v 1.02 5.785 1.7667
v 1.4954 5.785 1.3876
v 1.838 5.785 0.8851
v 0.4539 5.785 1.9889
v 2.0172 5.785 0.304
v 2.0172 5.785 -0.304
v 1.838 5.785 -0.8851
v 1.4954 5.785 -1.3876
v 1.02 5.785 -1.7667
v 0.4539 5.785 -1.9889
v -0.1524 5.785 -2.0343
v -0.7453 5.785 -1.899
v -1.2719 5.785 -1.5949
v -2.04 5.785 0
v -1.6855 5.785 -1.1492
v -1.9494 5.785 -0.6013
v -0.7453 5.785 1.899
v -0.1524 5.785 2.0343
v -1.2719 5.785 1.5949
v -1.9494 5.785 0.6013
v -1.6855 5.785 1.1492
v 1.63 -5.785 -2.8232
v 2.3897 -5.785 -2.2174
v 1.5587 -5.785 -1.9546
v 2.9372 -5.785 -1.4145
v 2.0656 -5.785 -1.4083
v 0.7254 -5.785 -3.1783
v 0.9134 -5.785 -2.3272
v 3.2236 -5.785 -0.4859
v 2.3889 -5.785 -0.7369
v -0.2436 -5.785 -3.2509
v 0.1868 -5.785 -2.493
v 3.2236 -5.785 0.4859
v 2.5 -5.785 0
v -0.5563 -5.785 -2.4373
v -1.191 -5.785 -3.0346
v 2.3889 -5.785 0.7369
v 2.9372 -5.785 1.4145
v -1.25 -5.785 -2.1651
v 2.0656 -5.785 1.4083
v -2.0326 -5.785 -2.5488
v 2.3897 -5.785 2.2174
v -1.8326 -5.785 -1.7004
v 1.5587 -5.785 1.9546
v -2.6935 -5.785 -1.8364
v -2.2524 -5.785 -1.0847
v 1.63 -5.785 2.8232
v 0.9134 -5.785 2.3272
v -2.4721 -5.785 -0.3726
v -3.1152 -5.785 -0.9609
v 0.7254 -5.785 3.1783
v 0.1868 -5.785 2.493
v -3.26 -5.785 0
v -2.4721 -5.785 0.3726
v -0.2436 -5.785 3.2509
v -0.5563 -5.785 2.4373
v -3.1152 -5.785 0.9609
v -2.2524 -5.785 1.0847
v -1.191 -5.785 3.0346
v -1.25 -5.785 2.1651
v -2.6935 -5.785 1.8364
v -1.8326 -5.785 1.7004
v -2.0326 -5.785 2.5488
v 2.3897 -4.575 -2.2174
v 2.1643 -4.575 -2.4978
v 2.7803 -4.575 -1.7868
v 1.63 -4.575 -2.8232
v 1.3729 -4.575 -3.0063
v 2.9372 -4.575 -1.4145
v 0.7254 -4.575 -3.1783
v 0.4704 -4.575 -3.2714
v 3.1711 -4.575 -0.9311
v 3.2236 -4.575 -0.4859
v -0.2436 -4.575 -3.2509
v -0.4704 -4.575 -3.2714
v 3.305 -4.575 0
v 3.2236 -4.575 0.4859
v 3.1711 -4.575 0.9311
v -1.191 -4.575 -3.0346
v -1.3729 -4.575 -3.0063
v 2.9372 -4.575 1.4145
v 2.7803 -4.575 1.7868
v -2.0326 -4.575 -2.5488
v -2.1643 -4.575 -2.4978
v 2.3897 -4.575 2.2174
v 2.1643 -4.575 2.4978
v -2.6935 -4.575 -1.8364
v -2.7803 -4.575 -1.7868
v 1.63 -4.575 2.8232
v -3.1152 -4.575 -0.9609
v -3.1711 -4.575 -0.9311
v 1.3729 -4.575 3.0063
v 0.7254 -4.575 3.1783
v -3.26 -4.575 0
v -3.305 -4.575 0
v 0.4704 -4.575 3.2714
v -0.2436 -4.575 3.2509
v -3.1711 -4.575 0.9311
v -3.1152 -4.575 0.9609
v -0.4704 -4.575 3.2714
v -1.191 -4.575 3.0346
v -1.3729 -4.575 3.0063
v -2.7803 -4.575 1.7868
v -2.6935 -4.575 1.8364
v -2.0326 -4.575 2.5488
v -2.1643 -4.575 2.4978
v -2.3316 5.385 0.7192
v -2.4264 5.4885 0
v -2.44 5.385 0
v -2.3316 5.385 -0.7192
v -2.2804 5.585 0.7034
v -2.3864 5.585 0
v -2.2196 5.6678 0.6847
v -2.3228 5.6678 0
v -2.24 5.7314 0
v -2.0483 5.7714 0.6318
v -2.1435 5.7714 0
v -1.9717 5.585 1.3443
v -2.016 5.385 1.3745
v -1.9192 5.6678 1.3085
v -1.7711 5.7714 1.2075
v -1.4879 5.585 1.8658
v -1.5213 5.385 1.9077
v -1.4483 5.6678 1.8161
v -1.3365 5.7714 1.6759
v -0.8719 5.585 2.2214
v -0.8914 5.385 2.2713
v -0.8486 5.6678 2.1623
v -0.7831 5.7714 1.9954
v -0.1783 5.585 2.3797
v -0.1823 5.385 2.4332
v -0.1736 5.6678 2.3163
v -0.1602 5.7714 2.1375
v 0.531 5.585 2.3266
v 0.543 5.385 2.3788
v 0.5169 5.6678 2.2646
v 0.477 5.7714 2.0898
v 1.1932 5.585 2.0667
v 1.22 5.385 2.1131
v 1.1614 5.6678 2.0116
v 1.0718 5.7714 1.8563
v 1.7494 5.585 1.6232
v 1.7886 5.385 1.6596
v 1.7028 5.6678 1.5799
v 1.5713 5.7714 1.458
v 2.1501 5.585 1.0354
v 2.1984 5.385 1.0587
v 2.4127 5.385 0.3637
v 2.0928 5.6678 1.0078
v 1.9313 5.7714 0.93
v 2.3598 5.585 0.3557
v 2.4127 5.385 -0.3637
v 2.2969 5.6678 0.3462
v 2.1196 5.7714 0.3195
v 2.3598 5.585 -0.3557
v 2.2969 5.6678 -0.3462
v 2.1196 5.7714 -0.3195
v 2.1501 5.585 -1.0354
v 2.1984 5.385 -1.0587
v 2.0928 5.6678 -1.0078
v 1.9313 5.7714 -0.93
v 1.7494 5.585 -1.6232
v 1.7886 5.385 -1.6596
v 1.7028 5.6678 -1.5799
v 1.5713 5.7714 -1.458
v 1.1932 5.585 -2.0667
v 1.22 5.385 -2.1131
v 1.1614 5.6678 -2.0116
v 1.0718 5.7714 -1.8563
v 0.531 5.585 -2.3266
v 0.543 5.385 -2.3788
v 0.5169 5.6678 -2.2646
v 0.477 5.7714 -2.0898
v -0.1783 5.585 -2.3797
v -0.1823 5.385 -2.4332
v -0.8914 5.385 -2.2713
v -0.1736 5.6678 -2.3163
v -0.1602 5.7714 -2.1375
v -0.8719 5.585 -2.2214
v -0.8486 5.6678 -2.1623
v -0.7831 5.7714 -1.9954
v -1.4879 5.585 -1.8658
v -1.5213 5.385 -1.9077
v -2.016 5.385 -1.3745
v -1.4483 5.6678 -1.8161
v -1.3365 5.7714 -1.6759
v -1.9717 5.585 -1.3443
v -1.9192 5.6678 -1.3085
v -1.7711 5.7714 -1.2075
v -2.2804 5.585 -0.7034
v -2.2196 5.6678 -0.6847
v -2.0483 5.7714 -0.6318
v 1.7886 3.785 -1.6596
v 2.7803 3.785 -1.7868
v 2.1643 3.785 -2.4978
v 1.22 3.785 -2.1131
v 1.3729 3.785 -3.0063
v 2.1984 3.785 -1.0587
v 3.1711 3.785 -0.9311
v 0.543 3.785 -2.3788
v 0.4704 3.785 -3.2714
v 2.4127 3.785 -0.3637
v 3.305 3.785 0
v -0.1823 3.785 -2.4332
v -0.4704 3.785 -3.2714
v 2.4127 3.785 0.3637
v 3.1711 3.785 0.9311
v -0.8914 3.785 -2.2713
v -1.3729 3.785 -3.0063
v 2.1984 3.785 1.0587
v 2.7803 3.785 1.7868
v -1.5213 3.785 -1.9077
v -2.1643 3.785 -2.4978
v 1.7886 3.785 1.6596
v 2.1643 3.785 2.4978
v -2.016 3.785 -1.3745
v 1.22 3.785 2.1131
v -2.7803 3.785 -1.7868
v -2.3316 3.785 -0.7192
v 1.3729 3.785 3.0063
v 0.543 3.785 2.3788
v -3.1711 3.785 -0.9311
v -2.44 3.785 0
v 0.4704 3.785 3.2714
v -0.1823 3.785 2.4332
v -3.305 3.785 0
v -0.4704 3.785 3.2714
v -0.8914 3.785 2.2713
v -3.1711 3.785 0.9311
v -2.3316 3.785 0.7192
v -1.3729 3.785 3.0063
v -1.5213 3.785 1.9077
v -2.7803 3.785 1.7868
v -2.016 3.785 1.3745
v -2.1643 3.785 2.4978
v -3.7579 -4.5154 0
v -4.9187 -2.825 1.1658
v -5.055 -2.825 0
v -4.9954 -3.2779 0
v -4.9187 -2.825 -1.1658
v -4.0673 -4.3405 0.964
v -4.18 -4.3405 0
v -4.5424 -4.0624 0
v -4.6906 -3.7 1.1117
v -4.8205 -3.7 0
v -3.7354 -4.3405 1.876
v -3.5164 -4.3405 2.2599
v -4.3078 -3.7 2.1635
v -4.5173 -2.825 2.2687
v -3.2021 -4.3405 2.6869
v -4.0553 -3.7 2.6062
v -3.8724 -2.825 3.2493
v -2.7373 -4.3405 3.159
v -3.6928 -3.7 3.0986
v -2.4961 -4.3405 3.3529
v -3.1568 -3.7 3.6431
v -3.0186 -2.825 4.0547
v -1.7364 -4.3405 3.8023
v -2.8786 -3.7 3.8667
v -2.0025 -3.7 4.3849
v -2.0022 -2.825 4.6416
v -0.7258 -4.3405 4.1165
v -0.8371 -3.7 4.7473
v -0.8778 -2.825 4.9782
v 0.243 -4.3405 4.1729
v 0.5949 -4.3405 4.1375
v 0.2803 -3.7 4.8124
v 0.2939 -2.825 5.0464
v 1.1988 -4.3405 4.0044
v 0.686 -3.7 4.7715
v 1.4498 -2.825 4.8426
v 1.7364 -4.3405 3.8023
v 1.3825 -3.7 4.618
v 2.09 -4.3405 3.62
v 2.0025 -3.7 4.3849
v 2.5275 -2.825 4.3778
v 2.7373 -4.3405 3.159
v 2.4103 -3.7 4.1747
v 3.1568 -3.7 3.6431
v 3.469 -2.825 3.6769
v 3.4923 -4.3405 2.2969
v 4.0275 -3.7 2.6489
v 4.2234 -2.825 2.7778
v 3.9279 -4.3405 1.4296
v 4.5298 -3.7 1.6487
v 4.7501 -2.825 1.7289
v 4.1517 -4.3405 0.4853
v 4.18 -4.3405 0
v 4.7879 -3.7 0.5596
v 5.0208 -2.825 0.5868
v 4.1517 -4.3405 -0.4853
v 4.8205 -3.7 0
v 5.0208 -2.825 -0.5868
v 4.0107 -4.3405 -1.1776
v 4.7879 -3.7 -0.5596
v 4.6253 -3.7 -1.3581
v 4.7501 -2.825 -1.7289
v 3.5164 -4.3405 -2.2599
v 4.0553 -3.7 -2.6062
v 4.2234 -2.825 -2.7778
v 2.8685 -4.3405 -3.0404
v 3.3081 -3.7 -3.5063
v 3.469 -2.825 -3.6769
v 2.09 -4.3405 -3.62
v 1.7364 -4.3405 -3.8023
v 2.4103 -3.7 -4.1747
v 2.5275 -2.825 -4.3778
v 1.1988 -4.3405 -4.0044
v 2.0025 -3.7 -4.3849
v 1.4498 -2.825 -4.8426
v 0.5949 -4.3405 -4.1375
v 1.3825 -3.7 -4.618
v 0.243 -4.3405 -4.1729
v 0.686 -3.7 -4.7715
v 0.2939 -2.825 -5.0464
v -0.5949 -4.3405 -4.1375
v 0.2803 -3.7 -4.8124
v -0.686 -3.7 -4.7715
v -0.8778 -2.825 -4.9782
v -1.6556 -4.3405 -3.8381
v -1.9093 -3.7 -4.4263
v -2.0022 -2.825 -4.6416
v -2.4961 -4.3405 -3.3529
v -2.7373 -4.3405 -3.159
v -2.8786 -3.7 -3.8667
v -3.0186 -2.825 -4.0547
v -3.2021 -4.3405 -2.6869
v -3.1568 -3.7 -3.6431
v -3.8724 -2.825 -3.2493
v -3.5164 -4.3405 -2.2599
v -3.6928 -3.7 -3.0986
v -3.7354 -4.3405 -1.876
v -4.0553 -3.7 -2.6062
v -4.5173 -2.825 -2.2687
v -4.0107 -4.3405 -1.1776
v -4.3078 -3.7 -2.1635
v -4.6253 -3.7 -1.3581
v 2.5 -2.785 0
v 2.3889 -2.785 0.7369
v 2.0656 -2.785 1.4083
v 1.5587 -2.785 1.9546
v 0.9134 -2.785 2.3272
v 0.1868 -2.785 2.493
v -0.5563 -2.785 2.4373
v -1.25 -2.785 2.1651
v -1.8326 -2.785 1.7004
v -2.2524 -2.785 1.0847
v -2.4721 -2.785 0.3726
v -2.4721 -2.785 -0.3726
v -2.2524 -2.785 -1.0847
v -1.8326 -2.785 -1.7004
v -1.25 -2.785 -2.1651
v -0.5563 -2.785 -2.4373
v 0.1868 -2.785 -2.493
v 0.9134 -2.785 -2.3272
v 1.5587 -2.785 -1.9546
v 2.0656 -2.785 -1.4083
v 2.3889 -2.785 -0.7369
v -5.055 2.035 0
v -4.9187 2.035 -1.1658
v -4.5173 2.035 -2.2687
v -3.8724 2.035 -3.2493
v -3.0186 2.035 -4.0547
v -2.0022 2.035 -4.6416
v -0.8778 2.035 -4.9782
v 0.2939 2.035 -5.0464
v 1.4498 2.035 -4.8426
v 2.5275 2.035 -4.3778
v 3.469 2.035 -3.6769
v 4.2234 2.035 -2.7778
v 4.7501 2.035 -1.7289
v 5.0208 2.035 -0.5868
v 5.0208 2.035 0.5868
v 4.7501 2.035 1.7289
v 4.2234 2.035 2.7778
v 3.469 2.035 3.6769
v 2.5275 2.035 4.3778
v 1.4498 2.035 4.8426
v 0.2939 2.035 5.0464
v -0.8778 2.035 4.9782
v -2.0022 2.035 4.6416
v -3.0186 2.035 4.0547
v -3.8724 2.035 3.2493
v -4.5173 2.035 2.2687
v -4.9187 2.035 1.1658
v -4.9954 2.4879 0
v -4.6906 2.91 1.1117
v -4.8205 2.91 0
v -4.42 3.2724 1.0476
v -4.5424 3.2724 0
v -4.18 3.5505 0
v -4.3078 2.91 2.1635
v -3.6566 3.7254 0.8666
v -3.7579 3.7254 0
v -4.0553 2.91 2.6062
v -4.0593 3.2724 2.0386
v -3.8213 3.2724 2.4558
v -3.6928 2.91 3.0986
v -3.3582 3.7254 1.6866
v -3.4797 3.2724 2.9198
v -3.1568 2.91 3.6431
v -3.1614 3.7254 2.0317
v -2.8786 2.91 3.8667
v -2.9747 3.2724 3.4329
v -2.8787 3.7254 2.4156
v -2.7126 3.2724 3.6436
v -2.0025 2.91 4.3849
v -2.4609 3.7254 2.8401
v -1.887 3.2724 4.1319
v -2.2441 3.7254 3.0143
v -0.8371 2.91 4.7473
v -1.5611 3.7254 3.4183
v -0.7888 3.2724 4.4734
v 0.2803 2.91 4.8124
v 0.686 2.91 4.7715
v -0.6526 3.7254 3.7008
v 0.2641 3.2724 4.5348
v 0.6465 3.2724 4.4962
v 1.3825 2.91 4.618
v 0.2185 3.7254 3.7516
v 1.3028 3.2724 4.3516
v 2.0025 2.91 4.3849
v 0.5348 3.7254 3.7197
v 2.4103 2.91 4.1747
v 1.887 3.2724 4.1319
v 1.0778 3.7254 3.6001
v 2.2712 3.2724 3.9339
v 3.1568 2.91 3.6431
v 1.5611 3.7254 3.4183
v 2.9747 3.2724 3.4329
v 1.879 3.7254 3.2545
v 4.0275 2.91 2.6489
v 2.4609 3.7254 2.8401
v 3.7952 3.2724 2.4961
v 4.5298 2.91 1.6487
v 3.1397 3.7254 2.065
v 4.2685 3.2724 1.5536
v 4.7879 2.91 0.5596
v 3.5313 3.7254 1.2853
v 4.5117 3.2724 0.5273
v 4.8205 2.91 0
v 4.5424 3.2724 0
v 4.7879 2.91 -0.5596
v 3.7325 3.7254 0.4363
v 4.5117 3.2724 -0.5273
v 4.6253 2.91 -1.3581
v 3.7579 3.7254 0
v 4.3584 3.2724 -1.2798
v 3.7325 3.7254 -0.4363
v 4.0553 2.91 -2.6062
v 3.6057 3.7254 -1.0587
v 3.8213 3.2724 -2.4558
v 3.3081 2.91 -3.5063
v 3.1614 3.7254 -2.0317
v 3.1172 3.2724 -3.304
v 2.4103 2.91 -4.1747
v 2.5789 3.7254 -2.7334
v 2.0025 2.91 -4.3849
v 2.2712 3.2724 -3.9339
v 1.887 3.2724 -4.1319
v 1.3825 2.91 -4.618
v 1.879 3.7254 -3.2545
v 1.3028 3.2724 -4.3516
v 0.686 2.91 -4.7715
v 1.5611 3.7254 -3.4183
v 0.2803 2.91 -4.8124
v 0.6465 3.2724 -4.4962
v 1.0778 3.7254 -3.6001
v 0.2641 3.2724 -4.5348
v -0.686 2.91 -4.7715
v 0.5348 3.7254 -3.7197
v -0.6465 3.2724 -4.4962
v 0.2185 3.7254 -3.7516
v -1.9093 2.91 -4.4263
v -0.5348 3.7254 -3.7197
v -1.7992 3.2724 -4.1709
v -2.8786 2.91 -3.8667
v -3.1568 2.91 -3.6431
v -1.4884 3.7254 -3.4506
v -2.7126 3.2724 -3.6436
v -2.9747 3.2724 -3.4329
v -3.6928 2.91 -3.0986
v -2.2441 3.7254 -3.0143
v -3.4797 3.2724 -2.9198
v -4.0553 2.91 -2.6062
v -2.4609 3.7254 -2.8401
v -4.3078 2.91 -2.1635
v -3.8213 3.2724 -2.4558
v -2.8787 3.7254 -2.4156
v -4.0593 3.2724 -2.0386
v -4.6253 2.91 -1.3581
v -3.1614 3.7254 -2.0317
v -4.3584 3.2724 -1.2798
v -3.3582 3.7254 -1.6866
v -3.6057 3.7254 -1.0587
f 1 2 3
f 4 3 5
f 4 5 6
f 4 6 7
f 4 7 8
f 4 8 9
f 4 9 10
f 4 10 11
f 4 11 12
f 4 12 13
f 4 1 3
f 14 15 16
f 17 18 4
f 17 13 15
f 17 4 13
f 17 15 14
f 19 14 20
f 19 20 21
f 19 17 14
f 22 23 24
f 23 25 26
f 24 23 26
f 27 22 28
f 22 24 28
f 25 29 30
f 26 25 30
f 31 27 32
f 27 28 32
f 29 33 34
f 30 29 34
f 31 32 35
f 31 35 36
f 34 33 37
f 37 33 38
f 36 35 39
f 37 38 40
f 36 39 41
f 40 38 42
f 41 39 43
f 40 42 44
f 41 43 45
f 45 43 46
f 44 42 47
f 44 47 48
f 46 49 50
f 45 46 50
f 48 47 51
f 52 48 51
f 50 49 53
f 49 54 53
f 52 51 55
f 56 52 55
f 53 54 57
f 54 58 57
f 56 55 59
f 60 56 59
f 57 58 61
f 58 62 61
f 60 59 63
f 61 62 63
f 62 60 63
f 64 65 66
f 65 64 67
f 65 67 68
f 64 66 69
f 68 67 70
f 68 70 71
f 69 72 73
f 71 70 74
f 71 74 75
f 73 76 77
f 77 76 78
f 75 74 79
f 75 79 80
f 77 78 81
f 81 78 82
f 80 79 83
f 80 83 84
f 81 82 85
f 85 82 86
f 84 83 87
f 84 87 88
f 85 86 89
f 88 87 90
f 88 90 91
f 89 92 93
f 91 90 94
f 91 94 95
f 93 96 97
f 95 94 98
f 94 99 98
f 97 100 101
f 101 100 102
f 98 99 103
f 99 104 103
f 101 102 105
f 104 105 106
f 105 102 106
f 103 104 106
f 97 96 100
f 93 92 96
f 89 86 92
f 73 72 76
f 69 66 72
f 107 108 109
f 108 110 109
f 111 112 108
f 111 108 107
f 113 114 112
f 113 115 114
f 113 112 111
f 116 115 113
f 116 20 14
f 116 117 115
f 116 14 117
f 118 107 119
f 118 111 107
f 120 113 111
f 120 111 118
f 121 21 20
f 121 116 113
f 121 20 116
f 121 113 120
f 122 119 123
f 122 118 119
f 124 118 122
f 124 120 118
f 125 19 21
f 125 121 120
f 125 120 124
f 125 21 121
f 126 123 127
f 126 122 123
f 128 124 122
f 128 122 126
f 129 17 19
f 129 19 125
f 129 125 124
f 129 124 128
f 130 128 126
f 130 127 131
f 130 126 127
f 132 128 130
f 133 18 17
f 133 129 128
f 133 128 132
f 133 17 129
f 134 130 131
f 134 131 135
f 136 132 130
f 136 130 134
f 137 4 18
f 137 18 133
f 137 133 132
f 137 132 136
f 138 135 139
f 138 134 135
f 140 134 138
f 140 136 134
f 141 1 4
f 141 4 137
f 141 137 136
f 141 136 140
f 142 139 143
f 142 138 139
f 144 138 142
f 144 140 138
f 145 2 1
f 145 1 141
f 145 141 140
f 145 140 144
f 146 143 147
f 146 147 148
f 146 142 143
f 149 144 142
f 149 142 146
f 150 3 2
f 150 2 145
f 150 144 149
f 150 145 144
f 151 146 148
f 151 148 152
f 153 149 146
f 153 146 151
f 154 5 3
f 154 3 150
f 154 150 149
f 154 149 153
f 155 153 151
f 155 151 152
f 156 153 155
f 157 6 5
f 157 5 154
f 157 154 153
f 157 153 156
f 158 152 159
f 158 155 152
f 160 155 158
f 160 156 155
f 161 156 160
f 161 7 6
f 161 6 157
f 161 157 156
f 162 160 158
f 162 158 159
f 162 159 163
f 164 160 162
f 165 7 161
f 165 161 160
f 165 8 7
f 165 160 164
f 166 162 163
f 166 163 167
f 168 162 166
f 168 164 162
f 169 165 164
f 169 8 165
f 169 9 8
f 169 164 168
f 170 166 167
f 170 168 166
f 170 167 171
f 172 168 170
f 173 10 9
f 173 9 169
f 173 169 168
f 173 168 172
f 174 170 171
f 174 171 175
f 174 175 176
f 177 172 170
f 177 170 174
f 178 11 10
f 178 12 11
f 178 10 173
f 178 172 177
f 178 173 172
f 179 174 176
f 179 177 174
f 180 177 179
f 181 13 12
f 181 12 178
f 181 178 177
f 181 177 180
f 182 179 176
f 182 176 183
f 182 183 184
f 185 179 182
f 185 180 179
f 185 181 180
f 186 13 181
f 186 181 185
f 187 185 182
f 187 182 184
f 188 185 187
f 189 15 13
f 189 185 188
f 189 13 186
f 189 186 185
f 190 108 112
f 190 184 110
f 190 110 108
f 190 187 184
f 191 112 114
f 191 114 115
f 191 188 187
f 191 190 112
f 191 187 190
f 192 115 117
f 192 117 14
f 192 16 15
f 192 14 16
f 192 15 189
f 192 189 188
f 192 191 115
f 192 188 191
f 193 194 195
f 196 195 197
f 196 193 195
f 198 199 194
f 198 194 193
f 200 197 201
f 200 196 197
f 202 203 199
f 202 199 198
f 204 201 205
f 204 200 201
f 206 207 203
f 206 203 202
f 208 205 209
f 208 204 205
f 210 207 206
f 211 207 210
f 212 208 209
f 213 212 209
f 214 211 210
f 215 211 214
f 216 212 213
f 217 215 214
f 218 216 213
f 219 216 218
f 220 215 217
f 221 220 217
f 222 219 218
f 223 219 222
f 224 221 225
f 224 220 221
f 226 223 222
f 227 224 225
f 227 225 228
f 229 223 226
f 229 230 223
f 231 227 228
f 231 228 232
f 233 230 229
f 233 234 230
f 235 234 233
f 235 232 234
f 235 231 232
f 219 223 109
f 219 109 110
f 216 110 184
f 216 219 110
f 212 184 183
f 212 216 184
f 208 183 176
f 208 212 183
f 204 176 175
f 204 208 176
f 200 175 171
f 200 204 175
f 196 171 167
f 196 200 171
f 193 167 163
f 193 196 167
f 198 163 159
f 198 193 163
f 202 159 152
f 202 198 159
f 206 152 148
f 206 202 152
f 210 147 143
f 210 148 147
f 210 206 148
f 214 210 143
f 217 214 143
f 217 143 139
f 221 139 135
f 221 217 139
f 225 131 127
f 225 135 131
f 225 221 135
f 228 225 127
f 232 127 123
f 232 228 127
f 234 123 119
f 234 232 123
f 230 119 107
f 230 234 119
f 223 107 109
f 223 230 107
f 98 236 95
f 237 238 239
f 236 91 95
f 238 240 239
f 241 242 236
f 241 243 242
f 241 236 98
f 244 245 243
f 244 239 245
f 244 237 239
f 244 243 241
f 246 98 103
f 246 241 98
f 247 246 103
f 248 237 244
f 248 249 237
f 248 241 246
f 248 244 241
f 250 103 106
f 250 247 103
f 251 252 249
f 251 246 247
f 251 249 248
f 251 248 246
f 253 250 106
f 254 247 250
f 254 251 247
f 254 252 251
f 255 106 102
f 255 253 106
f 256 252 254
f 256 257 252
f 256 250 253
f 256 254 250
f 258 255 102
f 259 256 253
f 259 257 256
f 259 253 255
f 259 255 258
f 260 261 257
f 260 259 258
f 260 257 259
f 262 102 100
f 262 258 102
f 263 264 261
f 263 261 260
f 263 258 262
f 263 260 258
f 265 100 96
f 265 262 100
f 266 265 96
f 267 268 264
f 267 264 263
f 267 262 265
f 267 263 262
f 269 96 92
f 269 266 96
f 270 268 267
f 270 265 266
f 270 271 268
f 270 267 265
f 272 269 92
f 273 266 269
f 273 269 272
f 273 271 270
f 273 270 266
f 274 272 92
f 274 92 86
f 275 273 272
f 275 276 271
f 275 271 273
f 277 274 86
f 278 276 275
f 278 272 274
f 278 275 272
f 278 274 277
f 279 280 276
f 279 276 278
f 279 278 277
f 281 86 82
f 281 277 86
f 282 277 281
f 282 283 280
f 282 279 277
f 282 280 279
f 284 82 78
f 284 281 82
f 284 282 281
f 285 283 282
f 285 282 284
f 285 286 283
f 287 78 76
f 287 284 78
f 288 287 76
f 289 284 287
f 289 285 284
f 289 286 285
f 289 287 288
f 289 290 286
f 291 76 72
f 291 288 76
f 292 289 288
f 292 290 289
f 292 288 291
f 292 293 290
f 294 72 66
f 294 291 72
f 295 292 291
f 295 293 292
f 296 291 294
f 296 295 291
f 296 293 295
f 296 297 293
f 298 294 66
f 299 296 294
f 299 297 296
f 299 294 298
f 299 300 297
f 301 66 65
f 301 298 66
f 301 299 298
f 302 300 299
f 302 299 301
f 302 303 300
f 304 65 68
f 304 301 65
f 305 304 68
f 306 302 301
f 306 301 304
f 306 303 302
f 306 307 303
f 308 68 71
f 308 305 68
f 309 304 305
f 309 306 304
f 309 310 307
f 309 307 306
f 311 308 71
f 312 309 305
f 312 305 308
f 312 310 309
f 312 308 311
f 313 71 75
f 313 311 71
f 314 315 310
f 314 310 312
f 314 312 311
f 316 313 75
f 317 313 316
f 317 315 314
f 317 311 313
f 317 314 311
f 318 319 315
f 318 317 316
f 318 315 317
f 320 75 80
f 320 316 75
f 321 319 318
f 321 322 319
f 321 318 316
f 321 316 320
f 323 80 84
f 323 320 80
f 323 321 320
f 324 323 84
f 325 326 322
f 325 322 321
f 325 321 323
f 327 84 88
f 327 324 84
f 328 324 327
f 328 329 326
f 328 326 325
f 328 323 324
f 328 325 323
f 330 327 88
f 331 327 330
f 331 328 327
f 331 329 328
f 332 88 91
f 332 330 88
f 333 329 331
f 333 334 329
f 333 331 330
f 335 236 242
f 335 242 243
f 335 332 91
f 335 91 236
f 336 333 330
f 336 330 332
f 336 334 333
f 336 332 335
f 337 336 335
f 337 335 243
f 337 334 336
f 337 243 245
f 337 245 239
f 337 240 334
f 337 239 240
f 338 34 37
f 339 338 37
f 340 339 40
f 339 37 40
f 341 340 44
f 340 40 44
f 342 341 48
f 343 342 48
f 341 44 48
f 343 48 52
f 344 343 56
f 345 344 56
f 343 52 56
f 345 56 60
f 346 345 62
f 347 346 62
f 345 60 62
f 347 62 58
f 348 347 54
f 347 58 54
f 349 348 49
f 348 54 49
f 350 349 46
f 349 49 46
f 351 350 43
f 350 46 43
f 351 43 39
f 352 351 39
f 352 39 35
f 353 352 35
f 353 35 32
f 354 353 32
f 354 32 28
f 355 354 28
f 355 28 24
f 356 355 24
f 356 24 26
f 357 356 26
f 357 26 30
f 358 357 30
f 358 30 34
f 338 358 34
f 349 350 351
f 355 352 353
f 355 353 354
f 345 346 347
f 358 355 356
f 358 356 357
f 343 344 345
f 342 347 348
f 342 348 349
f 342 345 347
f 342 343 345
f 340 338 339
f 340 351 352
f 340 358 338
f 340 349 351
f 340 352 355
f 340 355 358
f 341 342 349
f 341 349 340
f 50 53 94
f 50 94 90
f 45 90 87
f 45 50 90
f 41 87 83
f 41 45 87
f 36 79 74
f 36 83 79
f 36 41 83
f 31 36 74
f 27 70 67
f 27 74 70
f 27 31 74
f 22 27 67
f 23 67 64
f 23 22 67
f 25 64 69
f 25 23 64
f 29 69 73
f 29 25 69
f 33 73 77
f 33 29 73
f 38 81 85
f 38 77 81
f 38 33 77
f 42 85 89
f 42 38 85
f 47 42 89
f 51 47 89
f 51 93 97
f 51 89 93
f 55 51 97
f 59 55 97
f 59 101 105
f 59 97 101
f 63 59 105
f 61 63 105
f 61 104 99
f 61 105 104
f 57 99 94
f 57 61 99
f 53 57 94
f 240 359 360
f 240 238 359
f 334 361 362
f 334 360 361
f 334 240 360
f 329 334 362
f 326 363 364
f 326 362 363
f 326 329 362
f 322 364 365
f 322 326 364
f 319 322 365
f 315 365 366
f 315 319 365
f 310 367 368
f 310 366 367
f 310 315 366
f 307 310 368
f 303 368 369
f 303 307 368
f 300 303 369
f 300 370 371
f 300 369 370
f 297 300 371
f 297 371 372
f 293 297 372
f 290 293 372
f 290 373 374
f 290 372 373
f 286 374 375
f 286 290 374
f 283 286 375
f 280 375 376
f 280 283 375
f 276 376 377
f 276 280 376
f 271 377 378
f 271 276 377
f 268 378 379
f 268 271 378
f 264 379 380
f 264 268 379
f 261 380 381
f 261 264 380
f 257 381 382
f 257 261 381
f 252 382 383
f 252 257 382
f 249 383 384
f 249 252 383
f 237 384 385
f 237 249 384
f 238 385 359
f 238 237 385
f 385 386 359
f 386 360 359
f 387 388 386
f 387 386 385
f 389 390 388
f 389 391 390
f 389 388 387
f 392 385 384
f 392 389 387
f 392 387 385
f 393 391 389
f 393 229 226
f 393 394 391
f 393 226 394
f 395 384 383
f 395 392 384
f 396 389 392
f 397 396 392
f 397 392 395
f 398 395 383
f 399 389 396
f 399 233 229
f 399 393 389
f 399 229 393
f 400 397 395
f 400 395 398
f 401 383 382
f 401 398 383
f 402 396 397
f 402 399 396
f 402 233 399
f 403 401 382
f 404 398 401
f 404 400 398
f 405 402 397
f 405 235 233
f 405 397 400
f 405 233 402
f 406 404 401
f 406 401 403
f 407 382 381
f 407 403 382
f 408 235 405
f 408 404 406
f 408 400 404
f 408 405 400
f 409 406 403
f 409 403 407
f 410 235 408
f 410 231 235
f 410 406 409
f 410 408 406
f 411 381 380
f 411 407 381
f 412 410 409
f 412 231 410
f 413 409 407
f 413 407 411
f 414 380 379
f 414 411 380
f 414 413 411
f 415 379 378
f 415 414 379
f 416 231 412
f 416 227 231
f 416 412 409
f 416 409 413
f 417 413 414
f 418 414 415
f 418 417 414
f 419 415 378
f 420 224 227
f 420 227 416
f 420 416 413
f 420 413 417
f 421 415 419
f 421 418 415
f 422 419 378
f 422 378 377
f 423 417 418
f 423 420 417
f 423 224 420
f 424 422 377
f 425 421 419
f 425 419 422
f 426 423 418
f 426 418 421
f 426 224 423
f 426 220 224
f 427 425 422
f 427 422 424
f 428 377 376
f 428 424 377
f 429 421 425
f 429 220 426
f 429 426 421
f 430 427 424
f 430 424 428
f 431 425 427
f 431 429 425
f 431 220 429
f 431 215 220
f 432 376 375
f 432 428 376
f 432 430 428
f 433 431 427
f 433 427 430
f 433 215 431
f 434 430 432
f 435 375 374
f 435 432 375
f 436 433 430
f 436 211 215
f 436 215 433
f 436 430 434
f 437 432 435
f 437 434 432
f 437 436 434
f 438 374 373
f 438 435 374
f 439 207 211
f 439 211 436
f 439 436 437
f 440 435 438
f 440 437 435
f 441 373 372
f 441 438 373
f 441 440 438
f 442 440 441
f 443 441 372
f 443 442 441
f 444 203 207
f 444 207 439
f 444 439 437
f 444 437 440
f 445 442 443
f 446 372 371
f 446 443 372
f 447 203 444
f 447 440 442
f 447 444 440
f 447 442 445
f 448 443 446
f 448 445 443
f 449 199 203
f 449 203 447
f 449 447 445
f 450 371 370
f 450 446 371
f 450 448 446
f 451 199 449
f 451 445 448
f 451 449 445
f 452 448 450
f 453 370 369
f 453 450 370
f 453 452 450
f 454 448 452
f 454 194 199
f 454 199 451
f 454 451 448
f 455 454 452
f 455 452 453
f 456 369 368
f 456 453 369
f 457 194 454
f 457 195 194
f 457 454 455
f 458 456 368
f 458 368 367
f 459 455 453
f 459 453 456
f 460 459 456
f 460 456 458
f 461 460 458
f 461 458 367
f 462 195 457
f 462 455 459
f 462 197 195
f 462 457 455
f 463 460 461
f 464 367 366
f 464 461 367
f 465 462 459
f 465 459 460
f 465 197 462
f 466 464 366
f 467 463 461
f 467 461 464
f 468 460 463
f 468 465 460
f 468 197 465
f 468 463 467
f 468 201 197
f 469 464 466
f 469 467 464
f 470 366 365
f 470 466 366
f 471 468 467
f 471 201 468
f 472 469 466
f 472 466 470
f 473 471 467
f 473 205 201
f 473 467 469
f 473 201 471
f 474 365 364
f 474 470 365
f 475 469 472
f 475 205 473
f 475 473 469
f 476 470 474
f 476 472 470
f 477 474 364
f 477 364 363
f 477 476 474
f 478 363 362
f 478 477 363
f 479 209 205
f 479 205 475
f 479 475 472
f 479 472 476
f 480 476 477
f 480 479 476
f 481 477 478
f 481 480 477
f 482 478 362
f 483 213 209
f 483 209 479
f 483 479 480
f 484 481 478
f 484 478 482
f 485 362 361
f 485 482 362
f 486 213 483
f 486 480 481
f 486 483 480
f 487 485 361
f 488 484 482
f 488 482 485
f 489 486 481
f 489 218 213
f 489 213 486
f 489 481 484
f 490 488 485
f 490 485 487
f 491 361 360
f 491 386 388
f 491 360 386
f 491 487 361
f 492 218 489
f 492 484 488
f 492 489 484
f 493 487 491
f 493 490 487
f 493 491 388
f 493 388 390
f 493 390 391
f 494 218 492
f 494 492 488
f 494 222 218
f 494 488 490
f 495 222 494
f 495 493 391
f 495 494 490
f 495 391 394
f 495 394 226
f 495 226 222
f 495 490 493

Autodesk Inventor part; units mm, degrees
ref_plane "YZ Plane" through (0, 0, 0) normal (1, 0, 0) x (0, 1, 0)
ref_plane "XZ Plane" through (0, 0, 0) normal (0, 1, 0) x (-1, 0, 0)
ref_plane "XY Plane" through (0, 0, 0) normal (0, 0, 1) x (1, 0, 0)
sketch "Sketch1" plane through (0, 0, 0) normal (0, 0, 1) x (1, 0, 0)
  line L0 (0, 5.785) -> (-2.44, 5.785)
  line L1 (-2.44, 5.785) -> (-2.44, 3.785)
  line L2 (-2.44, 3.785) -> (-5.055, 3.785)
  line L3 (-5.055, 3.785) -> (-5.055, -4.575)
  line L4 (-5.055, -4.575) -> (-3.26, -4.575)
  line L5 (-3.26, -4.575) -> (-3.26, -5.785)
  line L6 (-3.26, -5.785) -> (0, -5.785)
  line L7 (0, -5.785) -> (0, 5.785)
  point P0 (0, 0)
  point P1 (0, 0)
  dimension "d0" = 11.57
  dimension "d1" = 10.11
  dimension "d2" = 4.88
  dimension "d3" = 6.52
  dimension "d4" = 2
  dimension "d5" = 1.21
revolve "Revolution1" add sketch "Sketch1" angle 360 about axis through (0, -5.785, 0) along (0, 1, 0)
fillet "Fillet1" radius 1.75 2 edges at (5.055, 3.785, 0) (5.055, -4.575, 0)
fillet "Fillet2" radius 0.4 1 edges at (2.44, 5.785, 0)
sketch "Sketch2" plane through (0, -5.785, 0) normal (0, -1, 0) x (1, 0, 0)
  circle A0 centre (0, 0) radius 3.26 projected
  circle A1 centre (0, 0) radius 2.5
  dimension "d9" = 5
extrude "Extrusion1" cut sketch "Sketch2" against normal blind 3 contours A1
properties part number "HEAD" material "250"
